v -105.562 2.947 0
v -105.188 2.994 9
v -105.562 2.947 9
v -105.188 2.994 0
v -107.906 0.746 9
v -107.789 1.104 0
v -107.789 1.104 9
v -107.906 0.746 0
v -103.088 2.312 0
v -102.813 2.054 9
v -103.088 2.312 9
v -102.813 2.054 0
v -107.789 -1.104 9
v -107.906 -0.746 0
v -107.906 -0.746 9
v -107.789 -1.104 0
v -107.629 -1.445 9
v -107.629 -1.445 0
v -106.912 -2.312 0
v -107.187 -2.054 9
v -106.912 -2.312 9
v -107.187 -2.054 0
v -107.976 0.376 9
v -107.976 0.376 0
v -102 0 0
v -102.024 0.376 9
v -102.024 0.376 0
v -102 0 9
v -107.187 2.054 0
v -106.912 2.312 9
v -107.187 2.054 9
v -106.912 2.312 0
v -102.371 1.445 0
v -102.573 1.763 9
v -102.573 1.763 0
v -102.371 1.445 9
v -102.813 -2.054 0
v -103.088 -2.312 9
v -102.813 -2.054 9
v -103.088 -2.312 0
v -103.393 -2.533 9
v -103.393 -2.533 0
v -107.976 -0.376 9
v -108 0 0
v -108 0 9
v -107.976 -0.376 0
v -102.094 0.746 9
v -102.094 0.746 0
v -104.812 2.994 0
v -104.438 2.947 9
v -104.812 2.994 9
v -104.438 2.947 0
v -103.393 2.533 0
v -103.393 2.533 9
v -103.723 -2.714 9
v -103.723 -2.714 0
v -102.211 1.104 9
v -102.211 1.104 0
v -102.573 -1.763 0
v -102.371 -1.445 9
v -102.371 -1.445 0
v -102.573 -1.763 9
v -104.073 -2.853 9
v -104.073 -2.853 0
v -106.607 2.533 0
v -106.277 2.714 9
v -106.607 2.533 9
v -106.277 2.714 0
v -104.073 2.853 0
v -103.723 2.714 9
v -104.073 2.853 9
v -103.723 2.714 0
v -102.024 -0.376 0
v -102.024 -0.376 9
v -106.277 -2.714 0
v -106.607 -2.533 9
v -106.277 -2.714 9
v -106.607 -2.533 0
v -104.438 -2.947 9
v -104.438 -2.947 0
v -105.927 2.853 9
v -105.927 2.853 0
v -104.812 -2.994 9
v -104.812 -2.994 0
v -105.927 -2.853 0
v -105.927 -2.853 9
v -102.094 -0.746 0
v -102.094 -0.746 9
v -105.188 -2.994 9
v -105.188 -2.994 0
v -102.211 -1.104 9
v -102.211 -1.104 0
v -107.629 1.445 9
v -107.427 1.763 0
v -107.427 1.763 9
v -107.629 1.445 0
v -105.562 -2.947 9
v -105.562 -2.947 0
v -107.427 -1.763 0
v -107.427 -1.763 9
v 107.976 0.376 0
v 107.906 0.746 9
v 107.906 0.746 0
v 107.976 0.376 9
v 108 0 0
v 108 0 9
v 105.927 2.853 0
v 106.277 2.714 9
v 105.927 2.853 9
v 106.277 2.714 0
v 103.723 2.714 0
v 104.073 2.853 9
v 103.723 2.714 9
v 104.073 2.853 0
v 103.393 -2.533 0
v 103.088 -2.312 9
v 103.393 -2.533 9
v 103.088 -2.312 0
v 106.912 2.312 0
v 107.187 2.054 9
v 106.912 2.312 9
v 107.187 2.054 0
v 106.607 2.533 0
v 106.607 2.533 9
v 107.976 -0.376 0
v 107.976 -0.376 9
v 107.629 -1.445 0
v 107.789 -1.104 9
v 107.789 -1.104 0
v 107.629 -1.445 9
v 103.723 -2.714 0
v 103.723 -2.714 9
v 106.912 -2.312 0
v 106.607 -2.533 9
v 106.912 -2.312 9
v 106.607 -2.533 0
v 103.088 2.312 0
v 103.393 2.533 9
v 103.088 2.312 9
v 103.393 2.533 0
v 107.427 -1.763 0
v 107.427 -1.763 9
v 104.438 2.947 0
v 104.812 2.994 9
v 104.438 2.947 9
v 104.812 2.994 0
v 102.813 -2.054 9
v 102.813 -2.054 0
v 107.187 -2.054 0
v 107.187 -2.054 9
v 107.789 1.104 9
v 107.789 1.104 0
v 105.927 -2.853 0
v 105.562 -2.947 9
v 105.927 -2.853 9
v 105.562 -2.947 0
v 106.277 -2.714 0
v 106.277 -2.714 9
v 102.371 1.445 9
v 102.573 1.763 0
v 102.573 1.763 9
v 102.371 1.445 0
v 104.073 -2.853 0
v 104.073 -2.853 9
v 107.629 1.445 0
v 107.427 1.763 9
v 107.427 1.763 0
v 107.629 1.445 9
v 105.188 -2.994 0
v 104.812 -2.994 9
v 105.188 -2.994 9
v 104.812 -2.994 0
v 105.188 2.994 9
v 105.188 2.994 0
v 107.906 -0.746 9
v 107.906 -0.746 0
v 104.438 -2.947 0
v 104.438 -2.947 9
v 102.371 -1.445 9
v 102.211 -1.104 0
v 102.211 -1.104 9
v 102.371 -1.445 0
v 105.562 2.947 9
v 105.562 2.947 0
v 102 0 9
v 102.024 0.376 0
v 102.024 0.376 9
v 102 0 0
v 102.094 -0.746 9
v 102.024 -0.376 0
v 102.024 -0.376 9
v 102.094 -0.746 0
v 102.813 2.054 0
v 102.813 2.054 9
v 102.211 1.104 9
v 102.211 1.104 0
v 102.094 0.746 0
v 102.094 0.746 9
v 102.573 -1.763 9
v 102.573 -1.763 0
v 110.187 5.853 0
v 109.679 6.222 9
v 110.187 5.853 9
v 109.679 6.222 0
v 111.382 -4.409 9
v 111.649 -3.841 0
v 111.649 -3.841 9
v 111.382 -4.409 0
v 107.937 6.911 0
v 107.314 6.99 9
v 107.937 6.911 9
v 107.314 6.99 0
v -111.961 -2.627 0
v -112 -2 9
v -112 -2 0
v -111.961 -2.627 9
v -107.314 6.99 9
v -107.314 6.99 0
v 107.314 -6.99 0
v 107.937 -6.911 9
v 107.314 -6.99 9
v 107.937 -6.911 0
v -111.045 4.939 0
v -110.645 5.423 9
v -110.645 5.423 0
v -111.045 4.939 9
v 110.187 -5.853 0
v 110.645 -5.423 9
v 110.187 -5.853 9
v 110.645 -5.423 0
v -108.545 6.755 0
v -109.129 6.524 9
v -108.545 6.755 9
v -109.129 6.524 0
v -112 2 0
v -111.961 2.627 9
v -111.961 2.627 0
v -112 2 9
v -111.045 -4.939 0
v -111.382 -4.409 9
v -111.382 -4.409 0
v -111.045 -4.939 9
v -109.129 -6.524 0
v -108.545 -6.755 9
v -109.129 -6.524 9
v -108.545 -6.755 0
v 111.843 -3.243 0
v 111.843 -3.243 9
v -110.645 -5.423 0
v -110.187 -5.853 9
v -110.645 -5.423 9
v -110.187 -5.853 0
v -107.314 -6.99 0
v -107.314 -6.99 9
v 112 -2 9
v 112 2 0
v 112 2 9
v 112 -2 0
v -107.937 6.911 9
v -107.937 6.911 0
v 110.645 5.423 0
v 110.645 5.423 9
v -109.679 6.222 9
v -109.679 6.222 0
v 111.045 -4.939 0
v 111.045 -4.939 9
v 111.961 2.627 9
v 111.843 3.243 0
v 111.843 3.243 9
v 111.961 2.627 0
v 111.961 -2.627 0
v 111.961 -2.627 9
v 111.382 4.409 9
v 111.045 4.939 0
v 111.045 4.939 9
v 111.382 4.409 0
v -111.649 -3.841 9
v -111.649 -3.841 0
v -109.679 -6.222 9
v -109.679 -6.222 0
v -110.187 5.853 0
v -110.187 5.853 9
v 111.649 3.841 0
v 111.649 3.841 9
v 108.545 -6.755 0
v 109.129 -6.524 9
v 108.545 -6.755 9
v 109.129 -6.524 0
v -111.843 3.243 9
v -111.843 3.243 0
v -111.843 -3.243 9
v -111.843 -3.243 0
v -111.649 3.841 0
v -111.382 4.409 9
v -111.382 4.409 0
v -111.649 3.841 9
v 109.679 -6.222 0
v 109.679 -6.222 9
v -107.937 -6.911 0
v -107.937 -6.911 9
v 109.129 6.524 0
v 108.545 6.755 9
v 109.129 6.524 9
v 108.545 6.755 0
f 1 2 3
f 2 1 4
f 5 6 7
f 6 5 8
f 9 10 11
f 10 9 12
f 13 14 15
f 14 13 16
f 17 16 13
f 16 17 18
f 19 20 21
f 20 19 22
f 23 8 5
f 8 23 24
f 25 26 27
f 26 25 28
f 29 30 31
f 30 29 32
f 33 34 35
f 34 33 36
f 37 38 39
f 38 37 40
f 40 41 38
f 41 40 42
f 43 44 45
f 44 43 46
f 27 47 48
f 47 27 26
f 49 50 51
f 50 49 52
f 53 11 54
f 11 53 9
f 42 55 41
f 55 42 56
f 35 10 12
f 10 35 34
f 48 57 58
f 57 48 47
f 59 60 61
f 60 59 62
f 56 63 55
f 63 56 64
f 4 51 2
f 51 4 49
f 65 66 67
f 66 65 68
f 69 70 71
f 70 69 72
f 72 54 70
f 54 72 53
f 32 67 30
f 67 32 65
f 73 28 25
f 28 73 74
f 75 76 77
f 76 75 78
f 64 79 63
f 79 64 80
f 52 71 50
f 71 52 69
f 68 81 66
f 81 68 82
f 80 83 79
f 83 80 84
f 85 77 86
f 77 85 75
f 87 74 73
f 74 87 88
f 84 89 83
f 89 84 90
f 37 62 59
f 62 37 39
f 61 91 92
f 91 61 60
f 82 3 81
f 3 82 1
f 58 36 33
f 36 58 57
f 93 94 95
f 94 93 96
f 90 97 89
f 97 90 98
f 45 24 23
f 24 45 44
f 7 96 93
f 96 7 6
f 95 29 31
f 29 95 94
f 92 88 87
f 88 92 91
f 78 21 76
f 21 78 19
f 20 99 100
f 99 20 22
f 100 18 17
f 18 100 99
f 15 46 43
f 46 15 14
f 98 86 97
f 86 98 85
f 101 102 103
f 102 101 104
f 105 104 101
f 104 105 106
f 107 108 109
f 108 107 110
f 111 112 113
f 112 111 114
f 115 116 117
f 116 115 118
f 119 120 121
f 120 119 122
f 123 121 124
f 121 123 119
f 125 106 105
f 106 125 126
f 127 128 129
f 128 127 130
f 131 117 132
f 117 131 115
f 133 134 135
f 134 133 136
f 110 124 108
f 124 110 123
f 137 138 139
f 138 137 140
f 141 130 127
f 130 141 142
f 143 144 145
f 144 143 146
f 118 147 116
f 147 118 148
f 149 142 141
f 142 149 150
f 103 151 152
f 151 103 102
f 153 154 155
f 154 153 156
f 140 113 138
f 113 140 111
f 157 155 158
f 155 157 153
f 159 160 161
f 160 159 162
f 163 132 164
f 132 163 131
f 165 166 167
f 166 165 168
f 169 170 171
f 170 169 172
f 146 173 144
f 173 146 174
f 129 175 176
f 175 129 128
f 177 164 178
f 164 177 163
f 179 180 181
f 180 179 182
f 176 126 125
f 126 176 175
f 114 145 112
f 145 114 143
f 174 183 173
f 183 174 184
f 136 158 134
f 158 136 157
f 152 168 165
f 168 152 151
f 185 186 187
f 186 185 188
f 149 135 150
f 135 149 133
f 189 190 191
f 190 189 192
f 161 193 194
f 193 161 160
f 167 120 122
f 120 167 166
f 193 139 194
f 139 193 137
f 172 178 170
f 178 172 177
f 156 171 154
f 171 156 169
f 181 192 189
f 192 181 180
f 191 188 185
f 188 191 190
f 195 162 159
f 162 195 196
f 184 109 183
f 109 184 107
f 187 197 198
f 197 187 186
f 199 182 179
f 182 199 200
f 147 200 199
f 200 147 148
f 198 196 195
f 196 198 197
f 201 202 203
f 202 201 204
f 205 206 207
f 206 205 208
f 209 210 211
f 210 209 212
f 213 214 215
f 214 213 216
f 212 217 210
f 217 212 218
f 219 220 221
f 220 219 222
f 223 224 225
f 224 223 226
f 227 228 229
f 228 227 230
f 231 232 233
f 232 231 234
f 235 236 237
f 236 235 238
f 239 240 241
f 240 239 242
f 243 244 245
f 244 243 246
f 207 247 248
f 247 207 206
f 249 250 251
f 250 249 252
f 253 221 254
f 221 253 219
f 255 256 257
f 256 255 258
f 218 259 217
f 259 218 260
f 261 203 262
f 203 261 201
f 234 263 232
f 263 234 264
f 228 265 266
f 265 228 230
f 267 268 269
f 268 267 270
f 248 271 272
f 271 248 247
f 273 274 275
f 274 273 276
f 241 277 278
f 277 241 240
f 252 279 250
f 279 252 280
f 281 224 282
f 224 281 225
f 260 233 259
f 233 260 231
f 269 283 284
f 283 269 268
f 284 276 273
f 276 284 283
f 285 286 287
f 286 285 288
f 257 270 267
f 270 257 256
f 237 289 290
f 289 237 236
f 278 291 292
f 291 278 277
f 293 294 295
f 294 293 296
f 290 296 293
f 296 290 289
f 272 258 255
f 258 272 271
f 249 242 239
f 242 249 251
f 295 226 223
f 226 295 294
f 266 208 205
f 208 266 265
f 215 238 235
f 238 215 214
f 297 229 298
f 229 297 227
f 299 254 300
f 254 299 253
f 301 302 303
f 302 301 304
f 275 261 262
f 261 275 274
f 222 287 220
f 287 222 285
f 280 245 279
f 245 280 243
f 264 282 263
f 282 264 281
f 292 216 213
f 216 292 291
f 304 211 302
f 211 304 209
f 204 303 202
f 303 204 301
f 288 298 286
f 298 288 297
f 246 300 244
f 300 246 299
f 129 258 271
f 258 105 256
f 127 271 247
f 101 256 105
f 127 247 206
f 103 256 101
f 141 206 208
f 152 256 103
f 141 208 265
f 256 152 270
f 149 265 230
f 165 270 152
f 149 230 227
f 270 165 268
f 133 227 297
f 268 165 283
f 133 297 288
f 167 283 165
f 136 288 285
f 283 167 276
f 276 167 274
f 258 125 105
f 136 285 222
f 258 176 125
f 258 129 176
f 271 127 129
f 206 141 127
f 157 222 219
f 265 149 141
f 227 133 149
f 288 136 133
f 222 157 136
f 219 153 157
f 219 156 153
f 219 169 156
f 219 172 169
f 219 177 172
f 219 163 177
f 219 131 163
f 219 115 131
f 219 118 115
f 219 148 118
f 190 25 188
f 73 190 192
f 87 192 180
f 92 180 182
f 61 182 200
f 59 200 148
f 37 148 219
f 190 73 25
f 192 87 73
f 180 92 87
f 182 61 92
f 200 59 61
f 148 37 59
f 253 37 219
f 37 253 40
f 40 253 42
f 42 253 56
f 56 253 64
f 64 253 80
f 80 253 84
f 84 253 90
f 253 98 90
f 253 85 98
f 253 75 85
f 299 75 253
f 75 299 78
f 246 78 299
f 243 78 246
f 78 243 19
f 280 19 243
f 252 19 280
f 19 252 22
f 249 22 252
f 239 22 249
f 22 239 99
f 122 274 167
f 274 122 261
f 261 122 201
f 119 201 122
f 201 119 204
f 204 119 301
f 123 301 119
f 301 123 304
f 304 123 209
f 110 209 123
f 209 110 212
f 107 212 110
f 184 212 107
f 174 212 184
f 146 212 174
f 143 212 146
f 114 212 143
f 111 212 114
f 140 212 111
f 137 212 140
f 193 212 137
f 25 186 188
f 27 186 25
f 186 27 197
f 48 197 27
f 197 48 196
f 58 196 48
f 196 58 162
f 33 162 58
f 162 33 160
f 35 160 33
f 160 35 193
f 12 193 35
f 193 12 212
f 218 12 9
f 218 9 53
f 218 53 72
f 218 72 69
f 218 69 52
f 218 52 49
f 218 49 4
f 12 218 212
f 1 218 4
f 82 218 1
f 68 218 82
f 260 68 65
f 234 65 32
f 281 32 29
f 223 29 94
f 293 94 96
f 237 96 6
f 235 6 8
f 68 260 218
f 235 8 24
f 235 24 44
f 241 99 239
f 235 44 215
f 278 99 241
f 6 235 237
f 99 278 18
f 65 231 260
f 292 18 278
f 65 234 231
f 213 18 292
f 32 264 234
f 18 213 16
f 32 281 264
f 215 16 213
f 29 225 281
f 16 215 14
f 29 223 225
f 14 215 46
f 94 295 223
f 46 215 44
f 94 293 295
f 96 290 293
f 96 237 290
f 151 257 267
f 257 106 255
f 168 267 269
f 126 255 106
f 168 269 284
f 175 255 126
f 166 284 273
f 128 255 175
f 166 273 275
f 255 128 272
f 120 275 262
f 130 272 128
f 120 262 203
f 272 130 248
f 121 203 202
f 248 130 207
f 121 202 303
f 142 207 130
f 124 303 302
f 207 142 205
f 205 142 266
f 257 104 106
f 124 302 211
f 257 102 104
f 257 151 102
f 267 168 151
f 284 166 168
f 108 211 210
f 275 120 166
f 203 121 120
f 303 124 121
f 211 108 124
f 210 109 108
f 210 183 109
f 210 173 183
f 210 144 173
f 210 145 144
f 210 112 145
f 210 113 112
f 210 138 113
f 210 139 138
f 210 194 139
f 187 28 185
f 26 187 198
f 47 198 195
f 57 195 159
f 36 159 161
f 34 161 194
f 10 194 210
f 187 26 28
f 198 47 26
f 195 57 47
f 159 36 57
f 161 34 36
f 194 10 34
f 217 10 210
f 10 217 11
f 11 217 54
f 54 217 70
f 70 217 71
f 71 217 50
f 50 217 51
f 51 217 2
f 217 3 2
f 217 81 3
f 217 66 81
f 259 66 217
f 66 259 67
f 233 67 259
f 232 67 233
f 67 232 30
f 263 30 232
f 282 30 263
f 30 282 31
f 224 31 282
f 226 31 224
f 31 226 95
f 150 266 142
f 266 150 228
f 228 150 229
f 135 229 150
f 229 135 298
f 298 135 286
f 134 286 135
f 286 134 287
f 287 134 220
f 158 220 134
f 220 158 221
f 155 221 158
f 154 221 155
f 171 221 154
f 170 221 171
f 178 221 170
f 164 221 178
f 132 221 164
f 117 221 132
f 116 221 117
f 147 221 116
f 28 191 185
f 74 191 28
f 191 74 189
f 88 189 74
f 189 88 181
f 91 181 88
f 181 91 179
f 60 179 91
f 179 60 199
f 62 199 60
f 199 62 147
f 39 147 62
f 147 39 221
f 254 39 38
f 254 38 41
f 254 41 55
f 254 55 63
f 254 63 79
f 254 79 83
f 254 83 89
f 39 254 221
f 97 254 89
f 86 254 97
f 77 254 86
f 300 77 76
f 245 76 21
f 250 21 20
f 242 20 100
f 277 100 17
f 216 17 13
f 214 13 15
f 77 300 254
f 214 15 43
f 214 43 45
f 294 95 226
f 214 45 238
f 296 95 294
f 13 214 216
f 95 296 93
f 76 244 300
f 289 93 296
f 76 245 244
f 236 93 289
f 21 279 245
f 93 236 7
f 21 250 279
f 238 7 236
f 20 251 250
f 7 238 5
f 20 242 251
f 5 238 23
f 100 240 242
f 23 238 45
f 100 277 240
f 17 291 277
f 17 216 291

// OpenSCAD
$fn = 50;


difference() {
	union() {
		hull() {
			translate(v = [-107.0000000000, 2.0000000000, 0]) {
				cylinder(h = 9, r = 5);
			}
			translate(v = [107.0000000000, 2.0000000000, 0]) {
				cylinder(h = 9, r = 5);
			}
			translate(v = [-107.0000000000, -2.0000000000, 0]) {
				cylinder(h = 9, r = 5);
			}
			translate(v = [107.0000000000, -2.0000000000, 0]) {
				cylinder(h = 9, r = 5);
			}
		}
	}
	union() {
		translate(v = [-105.0000000000, 0.0000000000, -100.0000000000]) {
			cylinder(h = 200, r = 3.0000000000);
		}
		translate(v = [-105.0000000000, 0.0000000000, -100.0000000000]) {
			cylinder(h = 200, r = 3.0000000000);
		}
		translate(v = [105.0000000000, 0.0000000000, -100.0000000000]) {
			cylinder(h = 200, r = 3.0000000000);
		}
		translate(v = [105.0000000000, 0.0000000000, -100.0000000000]) {
			cylinder(h = 200, r = 3.0000000000);
		}
	}
}
